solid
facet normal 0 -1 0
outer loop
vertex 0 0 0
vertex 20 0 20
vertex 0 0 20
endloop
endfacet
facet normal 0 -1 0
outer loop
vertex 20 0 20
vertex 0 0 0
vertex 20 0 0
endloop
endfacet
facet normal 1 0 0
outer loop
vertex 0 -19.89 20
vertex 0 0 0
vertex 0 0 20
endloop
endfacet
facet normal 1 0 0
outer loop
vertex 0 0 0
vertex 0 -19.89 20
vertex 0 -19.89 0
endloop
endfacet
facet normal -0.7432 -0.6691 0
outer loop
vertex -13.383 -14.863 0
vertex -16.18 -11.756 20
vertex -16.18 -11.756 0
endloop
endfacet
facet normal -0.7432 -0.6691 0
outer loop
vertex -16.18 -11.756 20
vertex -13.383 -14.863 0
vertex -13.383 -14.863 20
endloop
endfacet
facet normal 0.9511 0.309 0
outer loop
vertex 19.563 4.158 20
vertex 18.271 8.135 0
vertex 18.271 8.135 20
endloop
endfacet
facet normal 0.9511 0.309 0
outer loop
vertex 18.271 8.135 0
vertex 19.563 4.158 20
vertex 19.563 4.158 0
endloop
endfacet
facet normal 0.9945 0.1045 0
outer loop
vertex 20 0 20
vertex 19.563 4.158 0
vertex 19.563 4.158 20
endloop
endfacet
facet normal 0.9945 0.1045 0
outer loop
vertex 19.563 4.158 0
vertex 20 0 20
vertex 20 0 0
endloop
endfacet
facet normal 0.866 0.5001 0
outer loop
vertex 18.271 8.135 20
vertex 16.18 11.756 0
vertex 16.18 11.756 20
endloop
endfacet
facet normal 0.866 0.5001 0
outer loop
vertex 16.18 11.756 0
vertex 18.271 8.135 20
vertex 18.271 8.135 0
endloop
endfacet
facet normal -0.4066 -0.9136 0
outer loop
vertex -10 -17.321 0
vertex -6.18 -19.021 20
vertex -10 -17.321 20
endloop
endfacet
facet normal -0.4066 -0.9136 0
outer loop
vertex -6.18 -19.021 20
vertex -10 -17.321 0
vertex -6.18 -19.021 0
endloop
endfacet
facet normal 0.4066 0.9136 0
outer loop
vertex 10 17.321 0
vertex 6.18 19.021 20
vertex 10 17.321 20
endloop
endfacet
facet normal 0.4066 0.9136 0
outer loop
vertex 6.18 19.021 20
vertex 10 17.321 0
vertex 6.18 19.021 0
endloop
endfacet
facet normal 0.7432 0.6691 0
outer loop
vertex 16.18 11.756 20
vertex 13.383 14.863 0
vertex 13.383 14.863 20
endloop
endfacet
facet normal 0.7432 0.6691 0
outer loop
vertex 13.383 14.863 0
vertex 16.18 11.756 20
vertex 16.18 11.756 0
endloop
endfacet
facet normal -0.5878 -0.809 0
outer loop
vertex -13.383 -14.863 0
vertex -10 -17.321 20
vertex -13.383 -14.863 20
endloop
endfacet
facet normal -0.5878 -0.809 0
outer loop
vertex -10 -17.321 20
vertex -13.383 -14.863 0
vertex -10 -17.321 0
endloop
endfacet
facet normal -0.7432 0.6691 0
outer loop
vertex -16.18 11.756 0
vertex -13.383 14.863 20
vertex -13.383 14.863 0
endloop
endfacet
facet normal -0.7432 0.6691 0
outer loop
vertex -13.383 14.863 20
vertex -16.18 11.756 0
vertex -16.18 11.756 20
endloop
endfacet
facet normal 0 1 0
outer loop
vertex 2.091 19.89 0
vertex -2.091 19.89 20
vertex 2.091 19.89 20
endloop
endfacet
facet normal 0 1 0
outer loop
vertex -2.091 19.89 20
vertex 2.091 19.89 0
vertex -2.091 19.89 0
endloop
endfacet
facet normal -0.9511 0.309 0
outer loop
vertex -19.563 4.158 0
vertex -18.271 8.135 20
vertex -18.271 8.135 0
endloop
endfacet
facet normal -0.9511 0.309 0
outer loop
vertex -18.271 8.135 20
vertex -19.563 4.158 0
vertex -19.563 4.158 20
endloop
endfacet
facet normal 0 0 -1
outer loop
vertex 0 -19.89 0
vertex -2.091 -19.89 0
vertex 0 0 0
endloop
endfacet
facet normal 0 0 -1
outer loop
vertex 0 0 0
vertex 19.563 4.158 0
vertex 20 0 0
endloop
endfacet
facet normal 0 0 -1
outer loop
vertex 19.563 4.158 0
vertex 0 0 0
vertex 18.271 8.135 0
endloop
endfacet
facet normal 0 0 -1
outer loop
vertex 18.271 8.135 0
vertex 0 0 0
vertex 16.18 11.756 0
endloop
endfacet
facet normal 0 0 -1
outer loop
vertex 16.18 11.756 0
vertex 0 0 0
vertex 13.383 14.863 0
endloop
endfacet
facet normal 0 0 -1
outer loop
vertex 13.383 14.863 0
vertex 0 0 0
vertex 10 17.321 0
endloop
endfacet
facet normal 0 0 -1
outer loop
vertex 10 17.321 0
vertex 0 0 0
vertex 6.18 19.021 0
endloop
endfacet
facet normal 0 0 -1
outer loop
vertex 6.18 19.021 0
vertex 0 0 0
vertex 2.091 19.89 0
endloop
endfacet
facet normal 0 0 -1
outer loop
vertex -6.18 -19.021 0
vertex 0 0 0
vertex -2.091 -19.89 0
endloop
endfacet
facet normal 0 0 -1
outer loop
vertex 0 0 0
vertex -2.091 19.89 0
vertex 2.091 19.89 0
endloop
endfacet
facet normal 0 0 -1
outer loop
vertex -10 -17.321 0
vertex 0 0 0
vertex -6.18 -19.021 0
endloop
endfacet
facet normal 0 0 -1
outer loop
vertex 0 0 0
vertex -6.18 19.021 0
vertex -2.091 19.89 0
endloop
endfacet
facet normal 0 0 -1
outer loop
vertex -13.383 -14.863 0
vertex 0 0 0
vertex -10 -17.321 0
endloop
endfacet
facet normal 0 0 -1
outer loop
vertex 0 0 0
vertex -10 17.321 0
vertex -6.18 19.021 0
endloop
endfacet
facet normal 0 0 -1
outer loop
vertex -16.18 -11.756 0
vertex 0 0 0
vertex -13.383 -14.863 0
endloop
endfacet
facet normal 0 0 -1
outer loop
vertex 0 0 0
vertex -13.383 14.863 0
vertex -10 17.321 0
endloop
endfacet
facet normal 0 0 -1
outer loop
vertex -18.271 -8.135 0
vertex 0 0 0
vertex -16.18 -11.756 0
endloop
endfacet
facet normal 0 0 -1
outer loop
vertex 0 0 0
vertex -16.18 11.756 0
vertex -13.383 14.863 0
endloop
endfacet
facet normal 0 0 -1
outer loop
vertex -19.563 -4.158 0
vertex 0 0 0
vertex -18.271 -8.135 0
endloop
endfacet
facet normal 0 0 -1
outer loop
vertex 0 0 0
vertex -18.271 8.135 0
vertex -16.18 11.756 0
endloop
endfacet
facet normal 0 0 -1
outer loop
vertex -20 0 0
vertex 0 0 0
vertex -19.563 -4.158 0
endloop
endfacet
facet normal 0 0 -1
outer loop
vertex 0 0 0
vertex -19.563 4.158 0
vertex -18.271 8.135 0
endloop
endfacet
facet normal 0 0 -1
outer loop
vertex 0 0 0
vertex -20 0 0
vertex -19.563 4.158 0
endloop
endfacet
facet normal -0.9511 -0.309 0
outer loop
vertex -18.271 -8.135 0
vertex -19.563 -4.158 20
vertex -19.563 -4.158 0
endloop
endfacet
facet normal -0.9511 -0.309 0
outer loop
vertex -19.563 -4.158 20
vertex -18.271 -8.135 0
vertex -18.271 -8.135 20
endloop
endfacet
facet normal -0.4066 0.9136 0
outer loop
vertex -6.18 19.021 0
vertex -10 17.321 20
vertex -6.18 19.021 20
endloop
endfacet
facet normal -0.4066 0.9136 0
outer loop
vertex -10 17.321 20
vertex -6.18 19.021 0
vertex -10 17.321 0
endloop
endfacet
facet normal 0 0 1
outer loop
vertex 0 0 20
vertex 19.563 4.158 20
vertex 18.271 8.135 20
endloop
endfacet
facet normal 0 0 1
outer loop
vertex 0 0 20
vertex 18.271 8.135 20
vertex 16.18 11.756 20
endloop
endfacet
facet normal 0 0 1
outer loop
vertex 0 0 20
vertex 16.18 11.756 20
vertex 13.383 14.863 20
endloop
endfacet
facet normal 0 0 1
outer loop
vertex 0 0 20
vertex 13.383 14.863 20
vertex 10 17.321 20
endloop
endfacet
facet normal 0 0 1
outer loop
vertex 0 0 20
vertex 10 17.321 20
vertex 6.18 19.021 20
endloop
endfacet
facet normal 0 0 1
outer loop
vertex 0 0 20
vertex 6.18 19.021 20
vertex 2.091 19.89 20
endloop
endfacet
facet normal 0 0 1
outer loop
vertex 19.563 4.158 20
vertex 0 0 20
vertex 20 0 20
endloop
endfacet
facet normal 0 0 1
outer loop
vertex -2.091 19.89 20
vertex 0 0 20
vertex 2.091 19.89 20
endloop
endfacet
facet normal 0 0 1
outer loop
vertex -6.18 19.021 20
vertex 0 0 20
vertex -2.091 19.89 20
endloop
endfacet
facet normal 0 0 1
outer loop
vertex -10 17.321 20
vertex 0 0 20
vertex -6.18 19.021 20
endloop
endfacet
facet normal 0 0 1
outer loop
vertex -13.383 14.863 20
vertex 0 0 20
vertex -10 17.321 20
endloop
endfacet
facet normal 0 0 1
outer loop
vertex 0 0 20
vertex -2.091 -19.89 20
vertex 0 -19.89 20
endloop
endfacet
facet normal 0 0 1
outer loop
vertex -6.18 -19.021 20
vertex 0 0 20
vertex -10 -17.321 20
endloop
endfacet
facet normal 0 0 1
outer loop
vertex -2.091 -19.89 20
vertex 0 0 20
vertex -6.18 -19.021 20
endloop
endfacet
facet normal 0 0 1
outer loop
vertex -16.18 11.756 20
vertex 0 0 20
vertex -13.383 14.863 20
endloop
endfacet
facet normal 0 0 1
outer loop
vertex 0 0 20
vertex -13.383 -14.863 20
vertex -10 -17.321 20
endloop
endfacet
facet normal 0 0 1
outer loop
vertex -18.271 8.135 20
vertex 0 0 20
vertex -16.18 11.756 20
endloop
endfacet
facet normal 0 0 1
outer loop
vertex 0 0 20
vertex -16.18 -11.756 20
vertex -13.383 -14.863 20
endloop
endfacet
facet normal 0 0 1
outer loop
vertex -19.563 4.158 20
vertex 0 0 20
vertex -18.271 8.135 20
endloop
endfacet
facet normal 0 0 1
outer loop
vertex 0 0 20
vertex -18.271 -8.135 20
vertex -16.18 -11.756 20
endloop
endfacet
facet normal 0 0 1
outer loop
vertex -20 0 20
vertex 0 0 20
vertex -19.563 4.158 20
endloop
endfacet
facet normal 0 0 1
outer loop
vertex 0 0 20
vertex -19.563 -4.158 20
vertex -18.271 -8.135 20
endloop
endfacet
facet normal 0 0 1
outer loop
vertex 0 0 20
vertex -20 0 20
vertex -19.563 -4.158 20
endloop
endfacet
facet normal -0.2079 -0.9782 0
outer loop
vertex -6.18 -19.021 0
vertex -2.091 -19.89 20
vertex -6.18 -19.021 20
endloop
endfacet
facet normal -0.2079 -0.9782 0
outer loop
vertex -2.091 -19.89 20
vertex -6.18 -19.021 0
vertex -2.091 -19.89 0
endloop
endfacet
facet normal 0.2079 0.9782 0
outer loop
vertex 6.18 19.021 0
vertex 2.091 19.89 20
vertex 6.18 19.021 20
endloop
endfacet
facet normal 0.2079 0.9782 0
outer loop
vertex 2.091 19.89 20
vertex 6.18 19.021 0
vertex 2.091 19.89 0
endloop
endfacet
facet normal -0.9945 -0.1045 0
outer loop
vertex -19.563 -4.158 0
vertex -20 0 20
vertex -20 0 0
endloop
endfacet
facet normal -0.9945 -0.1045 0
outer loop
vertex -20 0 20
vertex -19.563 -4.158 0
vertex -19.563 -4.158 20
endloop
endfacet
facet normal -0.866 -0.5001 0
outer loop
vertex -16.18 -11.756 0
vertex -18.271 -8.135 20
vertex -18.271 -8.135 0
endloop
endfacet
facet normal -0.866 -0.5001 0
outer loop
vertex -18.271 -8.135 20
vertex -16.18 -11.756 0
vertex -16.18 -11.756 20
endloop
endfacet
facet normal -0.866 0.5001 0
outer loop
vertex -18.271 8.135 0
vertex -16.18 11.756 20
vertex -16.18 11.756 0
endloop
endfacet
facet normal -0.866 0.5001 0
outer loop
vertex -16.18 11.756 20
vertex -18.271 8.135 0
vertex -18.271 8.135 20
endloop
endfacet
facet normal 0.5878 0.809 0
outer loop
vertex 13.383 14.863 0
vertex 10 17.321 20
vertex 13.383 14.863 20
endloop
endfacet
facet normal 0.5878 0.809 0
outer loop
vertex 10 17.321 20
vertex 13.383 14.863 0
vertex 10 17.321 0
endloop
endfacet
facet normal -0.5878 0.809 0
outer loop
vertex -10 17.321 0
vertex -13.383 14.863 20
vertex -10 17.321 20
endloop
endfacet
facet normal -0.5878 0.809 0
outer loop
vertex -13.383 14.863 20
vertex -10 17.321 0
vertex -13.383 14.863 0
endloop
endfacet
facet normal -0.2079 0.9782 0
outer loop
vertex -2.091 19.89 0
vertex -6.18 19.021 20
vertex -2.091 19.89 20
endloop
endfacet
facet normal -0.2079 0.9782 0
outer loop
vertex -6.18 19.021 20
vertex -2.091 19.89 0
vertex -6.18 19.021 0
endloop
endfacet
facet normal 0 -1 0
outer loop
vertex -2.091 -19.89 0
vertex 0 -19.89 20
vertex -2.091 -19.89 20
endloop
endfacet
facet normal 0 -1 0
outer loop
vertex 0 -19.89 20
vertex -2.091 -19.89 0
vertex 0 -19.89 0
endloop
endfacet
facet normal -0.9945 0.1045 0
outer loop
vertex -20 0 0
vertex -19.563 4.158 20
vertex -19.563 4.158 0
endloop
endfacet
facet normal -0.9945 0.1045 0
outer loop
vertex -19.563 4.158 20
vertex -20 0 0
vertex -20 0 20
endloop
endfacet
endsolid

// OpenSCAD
// Transformations v.03
// (C) @oblomobka - 2015.09
// GPL3

// Transforma una forma en un sector de esa forma según un ángulo dado.

module sector(	angle, 		// es el ángulo del sector, lo que quedará de la forma original
				d=1000,		// valor auxiliar, será como mínimo igual al diámetro del cilindro que envuelve la forma original
				h=1000		// valor auxiliar, será como mínimo igual a la altura del cilindro que envuelve la forma original
				){

POINTS=[	[0,0,-h],
            [0,0,h],
            [d*cos(0*angle/4),d*sin(0*angle/4),-h],
            [d*cos(0*angle/4),d*sin(0*angle/4),h],
            [d*cos(1*angle/4),d*sin(1*angle/4),-h],
            [d*cos(1*angle/4),d*sin(1*angle/4),h],
            [d*cos(2*angle/4),d*sin(2*angle/4),-h],
            [d*cos(2*angle/4),d*sin(2*angle/4),h],
            [d*cos(3*angle/4),d*sin(3*angle/4),-h],
            [d*cos(3*angle/4),d*sin(3*angle/4),h],
            [d*cos(4*angle/4),d*sin(4*angle/4),-h],
            [d*cos(4*angle/4),d*sin(4*angle/4),h],
            ];

TRIANGLES=[	[0,1,2],
			[1,3,2],
			[2,3,4],
			[3,5,4],
			[4,5,6],
			[5,7,6],
			[6,7,8],
			[7,9,8],
			[8,9,10],
			[9,11,10],
			[10,11,0],
			[11,1,0],

			[5,3,1],
			[7,5,1],
			[9,7,1],
			[11,9,1],
			[0,2,4],
			[0,4,6],
			[0,6,8],
			[0,8,10]
			];

if(angle<=0 || angle>=360){
	children();
	}
	else{
		intersection(){
			polyhedron(points=POINTS,faces=TRIANGLES);
			children();
			}
		}
}


// Ejemplo
sector (270)
    cylinder(r=40/2,h=20); 
